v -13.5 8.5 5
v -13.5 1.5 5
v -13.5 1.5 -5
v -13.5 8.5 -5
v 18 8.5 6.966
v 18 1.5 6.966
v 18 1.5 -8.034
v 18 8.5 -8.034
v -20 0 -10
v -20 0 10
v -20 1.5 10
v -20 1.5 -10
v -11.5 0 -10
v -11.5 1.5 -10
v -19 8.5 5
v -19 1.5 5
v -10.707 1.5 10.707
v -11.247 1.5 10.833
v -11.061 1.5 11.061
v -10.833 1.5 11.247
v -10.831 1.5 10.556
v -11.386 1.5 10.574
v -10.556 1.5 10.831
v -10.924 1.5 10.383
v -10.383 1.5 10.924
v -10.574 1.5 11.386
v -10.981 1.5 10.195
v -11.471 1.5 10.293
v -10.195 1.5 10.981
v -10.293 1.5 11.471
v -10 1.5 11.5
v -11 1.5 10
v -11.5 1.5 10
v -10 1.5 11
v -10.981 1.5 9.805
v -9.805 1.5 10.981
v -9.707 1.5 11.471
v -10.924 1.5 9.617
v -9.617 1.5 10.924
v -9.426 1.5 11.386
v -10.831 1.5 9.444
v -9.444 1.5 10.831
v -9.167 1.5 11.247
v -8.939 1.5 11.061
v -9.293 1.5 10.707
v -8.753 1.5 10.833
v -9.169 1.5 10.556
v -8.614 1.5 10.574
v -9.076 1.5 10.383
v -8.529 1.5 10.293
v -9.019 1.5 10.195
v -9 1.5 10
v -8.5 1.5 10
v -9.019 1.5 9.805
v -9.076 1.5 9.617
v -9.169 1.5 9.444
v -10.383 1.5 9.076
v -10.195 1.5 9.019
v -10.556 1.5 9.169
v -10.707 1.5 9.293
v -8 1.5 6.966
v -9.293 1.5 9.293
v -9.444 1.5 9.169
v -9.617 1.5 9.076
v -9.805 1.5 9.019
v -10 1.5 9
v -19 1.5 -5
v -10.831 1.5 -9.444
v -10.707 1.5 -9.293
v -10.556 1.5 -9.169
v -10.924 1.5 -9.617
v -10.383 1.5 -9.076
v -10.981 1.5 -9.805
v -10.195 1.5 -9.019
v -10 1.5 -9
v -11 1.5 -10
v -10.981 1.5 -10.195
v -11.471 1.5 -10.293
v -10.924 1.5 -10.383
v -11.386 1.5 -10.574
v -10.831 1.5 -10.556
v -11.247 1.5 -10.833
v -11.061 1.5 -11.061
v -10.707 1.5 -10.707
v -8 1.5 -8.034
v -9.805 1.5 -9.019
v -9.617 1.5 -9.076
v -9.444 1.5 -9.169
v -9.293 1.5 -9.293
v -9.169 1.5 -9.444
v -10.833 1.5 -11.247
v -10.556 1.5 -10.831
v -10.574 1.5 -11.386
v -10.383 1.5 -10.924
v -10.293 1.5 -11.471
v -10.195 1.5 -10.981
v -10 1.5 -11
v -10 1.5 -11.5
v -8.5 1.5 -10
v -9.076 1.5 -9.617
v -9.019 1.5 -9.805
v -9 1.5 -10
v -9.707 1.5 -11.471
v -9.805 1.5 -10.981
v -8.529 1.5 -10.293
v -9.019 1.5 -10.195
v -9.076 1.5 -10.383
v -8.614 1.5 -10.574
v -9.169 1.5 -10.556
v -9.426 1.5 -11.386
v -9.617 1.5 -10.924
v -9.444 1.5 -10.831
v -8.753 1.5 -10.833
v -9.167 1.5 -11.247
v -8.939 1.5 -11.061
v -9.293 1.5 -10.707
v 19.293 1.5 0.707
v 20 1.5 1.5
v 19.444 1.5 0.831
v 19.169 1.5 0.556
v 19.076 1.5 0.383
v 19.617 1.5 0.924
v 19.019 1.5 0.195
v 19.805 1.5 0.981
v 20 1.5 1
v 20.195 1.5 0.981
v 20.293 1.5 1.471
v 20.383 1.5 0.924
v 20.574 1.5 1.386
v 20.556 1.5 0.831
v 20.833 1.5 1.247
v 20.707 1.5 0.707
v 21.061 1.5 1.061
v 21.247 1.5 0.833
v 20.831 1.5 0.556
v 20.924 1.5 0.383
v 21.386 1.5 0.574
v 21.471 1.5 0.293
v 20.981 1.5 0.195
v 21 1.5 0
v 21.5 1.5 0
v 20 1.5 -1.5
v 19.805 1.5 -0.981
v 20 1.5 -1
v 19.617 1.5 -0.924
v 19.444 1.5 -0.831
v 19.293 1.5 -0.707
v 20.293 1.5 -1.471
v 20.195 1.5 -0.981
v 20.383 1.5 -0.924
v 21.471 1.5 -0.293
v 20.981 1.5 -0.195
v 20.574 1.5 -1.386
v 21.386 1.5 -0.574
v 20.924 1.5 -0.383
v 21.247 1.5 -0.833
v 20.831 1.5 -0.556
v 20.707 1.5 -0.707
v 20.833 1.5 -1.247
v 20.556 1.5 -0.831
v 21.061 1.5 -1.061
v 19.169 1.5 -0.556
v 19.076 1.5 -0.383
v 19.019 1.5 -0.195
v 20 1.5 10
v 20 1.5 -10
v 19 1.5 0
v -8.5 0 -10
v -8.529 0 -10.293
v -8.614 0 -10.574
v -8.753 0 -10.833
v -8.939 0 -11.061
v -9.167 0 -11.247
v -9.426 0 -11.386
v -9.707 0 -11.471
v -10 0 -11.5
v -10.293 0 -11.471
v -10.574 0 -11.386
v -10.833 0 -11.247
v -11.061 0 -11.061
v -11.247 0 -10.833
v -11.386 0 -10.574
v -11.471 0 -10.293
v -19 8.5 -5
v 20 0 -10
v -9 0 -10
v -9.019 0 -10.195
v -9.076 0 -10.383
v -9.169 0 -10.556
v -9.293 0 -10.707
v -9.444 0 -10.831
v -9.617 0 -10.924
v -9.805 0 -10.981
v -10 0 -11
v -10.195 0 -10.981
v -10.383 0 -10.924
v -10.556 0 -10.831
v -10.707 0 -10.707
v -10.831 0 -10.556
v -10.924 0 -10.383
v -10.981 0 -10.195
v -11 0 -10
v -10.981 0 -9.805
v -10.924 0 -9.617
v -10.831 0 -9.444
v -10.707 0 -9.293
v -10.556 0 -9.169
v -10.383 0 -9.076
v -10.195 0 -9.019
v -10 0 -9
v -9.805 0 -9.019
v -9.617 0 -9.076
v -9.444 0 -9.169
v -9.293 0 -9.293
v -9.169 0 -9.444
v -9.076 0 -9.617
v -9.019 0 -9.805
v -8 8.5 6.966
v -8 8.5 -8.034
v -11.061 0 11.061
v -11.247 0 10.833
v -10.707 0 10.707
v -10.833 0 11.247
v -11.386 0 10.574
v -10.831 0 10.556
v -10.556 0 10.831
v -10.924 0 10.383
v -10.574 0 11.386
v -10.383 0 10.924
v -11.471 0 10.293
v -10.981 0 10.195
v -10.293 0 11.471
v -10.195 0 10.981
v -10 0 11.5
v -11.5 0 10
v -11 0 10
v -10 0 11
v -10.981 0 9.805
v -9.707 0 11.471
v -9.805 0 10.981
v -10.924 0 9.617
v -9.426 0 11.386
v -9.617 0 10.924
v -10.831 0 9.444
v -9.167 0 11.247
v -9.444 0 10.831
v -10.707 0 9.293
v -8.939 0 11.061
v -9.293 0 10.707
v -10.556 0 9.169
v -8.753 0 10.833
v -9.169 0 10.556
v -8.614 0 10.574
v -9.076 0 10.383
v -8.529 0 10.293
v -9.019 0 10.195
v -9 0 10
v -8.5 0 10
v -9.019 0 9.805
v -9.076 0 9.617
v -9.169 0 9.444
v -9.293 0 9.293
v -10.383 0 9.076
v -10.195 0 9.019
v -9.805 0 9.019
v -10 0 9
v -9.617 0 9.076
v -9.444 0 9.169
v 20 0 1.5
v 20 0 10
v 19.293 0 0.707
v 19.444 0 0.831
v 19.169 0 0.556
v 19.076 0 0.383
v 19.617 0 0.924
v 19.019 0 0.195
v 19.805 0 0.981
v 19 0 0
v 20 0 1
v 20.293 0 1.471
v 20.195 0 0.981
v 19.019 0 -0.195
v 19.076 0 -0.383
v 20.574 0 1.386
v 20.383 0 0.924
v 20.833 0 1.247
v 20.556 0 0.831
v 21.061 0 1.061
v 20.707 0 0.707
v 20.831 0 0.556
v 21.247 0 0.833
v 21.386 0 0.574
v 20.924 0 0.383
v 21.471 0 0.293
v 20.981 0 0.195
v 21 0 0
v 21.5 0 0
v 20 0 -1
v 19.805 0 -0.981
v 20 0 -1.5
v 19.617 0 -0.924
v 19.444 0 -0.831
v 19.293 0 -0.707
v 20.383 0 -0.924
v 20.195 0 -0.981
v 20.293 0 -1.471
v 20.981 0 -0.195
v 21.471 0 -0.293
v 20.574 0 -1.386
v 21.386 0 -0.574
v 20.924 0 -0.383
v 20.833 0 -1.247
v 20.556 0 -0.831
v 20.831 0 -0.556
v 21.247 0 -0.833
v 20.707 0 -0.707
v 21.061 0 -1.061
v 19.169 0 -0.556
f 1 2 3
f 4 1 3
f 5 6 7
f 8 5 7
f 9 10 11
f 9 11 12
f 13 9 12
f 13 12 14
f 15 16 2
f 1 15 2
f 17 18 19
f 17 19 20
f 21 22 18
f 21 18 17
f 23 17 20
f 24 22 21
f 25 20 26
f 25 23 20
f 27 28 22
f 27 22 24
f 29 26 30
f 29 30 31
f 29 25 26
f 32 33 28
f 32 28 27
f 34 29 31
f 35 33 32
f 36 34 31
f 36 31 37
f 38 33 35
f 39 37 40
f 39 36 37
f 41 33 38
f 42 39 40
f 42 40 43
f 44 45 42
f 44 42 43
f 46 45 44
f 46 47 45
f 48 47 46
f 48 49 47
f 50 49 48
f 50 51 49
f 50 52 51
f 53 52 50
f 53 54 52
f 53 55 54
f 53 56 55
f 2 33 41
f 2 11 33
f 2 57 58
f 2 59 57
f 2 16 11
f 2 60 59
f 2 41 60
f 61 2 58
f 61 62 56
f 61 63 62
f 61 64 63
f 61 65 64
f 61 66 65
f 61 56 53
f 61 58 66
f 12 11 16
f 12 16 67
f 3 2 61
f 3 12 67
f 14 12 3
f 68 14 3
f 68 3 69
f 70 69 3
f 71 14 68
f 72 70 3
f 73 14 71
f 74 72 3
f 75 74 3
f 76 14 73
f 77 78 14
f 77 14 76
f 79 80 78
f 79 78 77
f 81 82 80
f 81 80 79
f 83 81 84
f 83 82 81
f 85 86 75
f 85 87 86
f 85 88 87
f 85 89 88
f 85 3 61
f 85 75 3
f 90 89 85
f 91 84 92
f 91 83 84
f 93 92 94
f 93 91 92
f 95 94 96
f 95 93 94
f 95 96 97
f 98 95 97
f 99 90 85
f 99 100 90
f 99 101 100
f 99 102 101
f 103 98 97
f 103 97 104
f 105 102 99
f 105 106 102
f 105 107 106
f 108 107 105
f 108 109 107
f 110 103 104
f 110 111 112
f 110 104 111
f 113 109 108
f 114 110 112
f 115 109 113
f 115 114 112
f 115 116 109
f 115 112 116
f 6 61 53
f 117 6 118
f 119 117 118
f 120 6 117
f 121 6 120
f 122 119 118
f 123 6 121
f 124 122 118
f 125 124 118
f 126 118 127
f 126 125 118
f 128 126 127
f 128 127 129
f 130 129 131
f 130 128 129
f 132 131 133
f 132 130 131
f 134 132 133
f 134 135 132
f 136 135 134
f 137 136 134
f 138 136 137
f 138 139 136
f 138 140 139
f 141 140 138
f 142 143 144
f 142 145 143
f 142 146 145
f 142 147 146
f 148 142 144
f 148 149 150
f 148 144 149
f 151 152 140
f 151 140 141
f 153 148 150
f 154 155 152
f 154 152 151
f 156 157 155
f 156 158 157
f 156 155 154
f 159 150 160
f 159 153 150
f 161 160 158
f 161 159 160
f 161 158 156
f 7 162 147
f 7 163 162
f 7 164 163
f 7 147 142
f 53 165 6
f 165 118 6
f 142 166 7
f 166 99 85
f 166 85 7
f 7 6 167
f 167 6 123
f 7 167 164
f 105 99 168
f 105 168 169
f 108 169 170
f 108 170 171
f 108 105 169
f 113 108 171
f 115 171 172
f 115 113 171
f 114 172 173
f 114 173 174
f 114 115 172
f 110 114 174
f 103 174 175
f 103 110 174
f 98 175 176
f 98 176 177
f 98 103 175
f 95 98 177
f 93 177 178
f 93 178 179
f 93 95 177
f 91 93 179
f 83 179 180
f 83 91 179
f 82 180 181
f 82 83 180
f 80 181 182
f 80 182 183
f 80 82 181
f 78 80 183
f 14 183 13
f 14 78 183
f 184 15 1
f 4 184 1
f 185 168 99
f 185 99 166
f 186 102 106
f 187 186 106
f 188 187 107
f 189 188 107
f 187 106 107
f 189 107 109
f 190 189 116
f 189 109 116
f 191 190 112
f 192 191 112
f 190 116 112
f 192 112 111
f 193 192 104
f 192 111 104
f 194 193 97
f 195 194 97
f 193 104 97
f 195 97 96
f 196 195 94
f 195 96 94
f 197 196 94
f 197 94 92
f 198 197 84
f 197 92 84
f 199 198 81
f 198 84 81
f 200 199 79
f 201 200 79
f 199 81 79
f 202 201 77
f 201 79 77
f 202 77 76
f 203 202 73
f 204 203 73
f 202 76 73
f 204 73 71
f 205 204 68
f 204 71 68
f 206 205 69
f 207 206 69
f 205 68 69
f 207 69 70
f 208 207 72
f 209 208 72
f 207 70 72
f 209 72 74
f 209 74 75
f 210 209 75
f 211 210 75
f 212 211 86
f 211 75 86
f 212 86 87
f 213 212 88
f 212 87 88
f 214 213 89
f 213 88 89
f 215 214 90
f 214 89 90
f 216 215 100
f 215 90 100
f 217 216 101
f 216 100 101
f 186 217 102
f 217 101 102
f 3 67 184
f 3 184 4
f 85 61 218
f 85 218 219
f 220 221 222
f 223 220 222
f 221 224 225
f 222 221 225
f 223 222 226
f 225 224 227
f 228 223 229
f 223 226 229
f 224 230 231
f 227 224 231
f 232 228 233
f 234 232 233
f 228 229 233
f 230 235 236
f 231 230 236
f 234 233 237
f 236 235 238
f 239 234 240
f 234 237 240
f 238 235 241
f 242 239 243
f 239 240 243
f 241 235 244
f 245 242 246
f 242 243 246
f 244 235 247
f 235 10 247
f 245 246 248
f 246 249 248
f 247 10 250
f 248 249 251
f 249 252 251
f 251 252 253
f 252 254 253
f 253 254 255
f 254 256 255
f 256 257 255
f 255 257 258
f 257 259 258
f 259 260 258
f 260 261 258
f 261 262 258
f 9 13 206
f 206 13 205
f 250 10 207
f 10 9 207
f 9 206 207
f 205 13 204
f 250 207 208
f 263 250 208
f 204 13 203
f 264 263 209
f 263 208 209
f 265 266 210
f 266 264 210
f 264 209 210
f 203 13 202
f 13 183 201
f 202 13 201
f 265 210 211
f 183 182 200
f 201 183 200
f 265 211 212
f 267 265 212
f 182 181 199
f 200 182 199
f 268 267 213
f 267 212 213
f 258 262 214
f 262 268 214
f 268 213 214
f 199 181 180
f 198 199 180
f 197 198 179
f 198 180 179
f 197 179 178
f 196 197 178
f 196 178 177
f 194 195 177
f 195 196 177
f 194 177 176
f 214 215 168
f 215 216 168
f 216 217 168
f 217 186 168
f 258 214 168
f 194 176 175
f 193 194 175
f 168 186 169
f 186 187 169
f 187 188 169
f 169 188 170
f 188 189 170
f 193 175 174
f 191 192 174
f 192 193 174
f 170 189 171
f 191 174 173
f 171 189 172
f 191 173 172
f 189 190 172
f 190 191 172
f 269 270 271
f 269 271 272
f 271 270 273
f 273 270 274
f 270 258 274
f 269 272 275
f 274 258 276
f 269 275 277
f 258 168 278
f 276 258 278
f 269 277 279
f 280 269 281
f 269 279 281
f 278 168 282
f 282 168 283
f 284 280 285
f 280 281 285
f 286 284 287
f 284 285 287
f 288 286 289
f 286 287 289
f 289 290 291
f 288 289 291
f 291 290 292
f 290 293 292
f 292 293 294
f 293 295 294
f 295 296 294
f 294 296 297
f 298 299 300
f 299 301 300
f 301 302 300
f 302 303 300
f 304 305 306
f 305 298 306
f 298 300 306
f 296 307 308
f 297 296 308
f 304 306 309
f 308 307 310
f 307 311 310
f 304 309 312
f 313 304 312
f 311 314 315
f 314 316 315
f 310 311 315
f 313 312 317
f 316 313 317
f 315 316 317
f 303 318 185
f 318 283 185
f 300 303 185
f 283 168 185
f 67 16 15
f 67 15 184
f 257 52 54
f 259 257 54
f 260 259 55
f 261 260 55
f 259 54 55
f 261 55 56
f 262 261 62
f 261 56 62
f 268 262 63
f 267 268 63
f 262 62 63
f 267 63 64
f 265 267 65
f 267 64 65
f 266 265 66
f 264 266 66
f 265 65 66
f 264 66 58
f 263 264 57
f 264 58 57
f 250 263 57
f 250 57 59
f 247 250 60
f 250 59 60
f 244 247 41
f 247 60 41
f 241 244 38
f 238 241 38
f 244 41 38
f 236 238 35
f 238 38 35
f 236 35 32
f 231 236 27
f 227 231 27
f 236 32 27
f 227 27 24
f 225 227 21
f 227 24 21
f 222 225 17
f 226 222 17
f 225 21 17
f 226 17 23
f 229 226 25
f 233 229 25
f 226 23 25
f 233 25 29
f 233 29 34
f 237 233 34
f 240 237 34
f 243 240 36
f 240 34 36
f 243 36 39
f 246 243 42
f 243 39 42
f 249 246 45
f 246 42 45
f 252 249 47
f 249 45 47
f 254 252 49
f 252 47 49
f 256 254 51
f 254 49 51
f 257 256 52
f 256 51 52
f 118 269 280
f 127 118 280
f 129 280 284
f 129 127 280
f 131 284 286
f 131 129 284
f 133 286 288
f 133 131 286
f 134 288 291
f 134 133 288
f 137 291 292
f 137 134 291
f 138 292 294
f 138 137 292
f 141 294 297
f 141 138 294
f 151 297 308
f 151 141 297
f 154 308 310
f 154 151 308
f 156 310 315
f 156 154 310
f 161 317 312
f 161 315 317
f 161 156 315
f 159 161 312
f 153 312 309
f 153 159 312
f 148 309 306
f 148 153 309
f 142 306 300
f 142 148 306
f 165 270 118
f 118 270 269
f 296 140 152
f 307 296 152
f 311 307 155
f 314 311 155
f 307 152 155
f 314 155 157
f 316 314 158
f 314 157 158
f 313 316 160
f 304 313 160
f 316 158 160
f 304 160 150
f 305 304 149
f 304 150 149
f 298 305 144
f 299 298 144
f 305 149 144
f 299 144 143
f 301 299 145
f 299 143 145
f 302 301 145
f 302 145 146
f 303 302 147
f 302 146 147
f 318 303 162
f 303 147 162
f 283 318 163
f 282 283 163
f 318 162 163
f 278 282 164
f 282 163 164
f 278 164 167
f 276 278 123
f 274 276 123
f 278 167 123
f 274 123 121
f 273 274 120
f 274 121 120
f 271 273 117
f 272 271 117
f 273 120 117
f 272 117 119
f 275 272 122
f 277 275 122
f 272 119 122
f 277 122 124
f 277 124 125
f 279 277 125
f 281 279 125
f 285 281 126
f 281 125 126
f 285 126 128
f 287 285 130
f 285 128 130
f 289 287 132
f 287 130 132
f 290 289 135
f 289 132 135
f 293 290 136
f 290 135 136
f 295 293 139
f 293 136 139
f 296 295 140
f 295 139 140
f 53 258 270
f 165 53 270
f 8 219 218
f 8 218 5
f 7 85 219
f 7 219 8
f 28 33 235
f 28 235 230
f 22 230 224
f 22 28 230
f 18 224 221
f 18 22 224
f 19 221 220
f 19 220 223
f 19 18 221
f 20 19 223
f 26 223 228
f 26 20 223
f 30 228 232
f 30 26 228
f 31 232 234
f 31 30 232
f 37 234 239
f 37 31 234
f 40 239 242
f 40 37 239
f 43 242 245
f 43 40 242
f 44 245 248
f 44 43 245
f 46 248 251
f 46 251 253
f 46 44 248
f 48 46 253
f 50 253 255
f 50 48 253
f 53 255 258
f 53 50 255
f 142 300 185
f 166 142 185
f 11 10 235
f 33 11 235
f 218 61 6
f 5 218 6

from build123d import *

# Parameters (mm, degrees)
SKETCH1_W           = 40
SKETCH1_H           = 20
BOSS_EXTRUDE1_DEPTH = 1.5
SKETCH2_R           = 1.5
BOSS_EXTRUDE3_DEPTH = 1.5
SKETCH3_R           = 1
CUT_EXTRUDE1_DEPTH  = 1.5
SKETCH4_W           = 5.5
SKETCH4_H           = 10
BOSS_EXTRUDE4_DEPTH = 7
SKETCH5_W           = 26
SKETCH5_H           = 15
BOSS_EXTRUDE5_DEPTH = 7


with BuildPart() as part:
    # Sketch1 → Boss-Extrude1 (new body)
    with BuildSketch(Plane(origin=(0, 0, 0), x_dir=(1, 0, 0), z_dir=(0, 1, 0))):
        Rectangle(SKETCH1_W, SKETCH1_H)
    extrude(amount=BOSS_EXTRUDE1_DEPTH)

    # Sketch2 → Boss-Extrude3 (add)
    with BuildSketch(Plane(origin=(0, 1.5, 0), x_dir=(1, 0, 0), z_dir=(0, 1, 0))):
        with Locations((-10, 10)):
            Circle(SKETCH2_R)
        with Locations((-10, -10)):
            Circle(SKETCH2_R)
        with Locations((20, 0)):
            Circle(SKETCH2_R)
    extrude(amount=-BOSS_EXTRUDE3_DEPTH)

    # Sketch3 → Cut-Extrude1 (cut)
    with BuildSketch(Plane(origin=(0, 1.5, 0), x_dir=(1, 0, 0), z_dir=(0, 1, 0))):
        with Locations((-10, -10)):
            Circle(SKETCH3_R)
        with Locations((20, 0)):
            Circle(SKETCH3_R)
        with Locations((-10, 10)):
            Circle(SKETCH3_R)
    extrude(amount=-CUT_EXTRUDE1_DEPTH, mode=Mode.SUBTRACT)

    # Sketch4 → Boss-Extrude4 (add)
    with BuildSketch(Plane(origin=(0, 1.5, 0), x_dir=(1, 0, 0), z_dir=(0, 1, 0))):
        with Locations((-16.25, 0)):
            Rectangle(SKETCH4_W, SKETCH4_H)
    extrude(amount=BOSS_EXTRUDE4_DEPTH)

    # Sketch5 → Boss-Extrude5 (add)
    with BuildSketch(Plane(origin=(0, 1.5, 0), x_dir=(1, 0, 0), z_dir=(0, 1, 0))):
        with Locations((5, 0.53388581)):
            Rectangle(SKETCH5_W, SKETCH5_H)
    extrude(amount=BOSS_EXTRUDE5_DEPTH)


solid = part.part
